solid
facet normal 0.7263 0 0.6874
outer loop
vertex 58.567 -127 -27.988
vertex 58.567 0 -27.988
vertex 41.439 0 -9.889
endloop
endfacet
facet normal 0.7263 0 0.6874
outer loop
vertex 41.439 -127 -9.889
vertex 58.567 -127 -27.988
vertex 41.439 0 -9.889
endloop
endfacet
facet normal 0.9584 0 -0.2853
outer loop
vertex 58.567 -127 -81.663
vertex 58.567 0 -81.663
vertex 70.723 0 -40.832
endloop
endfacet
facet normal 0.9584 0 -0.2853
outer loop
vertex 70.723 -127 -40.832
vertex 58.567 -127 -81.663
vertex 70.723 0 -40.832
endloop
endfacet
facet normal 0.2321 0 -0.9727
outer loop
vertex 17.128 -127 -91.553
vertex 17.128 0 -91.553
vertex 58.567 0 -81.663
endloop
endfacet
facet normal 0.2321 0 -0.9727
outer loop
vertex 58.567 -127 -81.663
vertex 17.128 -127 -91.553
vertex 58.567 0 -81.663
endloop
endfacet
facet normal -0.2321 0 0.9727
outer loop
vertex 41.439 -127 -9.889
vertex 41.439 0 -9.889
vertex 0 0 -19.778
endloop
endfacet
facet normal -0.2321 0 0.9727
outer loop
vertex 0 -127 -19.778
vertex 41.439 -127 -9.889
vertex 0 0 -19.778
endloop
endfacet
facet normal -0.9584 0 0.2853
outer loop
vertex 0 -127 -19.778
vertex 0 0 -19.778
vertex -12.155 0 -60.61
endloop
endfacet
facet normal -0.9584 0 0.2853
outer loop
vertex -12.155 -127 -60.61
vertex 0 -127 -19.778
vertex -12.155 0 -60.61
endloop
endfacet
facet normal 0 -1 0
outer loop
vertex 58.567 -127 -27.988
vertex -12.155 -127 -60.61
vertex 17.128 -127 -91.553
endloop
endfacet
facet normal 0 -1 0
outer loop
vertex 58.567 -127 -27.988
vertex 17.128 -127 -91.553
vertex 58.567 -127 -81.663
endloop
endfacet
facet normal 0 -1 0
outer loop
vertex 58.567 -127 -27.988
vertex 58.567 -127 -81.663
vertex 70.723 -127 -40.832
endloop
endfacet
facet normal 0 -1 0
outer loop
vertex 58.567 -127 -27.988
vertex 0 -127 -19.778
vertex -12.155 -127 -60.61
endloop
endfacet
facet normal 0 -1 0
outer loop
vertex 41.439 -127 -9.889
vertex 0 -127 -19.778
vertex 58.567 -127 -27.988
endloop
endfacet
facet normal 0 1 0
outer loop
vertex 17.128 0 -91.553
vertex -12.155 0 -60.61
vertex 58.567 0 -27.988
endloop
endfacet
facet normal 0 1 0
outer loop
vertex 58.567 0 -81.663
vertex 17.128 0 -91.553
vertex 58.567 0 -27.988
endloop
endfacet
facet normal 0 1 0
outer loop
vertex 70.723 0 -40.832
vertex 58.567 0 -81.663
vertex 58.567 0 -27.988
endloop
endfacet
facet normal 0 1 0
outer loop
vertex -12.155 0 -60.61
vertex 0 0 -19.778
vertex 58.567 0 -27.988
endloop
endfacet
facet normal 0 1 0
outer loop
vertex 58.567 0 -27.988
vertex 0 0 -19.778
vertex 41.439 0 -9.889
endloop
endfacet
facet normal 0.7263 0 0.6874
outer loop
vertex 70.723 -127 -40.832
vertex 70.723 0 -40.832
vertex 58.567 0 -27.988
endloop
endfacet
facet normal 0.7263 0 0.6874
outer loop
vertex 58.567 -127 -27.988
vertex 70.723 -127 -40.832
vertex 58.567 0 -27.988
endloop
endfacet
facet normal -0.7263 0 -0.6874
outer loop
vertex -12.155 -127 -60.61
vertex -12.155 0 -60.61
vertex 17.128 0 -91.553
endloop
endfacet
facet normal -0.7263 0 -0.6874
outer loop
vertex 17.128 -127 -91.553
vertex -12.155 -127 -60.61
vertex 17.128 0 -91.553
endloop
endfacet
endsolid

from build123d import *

# Parameters (mm, degrees)
F1_DEPTH = 127


with BuildPart() as f1:
    # F0 (on Front) → F1 (new body)
    with BuildSketch(Plane.XZ):
        Polygon((58.567305, -33.813849), (0, -67.627698), (-12.155358, -60.609799), (17.128294, -91.552522), (58.567305, -81.663497), (70.722663, -40.831748), (58.567305, -27.987726), align=None)
        Polygon((-12.155358, -60.609799), (0, -67.627698), (58.567305, -33.813849), (58.567305, -27.987726), (41.43901, -9.889025), (0, -19.778051), align=None)
    extrude(amount=F1_DEPTH)


solid = f1.part
